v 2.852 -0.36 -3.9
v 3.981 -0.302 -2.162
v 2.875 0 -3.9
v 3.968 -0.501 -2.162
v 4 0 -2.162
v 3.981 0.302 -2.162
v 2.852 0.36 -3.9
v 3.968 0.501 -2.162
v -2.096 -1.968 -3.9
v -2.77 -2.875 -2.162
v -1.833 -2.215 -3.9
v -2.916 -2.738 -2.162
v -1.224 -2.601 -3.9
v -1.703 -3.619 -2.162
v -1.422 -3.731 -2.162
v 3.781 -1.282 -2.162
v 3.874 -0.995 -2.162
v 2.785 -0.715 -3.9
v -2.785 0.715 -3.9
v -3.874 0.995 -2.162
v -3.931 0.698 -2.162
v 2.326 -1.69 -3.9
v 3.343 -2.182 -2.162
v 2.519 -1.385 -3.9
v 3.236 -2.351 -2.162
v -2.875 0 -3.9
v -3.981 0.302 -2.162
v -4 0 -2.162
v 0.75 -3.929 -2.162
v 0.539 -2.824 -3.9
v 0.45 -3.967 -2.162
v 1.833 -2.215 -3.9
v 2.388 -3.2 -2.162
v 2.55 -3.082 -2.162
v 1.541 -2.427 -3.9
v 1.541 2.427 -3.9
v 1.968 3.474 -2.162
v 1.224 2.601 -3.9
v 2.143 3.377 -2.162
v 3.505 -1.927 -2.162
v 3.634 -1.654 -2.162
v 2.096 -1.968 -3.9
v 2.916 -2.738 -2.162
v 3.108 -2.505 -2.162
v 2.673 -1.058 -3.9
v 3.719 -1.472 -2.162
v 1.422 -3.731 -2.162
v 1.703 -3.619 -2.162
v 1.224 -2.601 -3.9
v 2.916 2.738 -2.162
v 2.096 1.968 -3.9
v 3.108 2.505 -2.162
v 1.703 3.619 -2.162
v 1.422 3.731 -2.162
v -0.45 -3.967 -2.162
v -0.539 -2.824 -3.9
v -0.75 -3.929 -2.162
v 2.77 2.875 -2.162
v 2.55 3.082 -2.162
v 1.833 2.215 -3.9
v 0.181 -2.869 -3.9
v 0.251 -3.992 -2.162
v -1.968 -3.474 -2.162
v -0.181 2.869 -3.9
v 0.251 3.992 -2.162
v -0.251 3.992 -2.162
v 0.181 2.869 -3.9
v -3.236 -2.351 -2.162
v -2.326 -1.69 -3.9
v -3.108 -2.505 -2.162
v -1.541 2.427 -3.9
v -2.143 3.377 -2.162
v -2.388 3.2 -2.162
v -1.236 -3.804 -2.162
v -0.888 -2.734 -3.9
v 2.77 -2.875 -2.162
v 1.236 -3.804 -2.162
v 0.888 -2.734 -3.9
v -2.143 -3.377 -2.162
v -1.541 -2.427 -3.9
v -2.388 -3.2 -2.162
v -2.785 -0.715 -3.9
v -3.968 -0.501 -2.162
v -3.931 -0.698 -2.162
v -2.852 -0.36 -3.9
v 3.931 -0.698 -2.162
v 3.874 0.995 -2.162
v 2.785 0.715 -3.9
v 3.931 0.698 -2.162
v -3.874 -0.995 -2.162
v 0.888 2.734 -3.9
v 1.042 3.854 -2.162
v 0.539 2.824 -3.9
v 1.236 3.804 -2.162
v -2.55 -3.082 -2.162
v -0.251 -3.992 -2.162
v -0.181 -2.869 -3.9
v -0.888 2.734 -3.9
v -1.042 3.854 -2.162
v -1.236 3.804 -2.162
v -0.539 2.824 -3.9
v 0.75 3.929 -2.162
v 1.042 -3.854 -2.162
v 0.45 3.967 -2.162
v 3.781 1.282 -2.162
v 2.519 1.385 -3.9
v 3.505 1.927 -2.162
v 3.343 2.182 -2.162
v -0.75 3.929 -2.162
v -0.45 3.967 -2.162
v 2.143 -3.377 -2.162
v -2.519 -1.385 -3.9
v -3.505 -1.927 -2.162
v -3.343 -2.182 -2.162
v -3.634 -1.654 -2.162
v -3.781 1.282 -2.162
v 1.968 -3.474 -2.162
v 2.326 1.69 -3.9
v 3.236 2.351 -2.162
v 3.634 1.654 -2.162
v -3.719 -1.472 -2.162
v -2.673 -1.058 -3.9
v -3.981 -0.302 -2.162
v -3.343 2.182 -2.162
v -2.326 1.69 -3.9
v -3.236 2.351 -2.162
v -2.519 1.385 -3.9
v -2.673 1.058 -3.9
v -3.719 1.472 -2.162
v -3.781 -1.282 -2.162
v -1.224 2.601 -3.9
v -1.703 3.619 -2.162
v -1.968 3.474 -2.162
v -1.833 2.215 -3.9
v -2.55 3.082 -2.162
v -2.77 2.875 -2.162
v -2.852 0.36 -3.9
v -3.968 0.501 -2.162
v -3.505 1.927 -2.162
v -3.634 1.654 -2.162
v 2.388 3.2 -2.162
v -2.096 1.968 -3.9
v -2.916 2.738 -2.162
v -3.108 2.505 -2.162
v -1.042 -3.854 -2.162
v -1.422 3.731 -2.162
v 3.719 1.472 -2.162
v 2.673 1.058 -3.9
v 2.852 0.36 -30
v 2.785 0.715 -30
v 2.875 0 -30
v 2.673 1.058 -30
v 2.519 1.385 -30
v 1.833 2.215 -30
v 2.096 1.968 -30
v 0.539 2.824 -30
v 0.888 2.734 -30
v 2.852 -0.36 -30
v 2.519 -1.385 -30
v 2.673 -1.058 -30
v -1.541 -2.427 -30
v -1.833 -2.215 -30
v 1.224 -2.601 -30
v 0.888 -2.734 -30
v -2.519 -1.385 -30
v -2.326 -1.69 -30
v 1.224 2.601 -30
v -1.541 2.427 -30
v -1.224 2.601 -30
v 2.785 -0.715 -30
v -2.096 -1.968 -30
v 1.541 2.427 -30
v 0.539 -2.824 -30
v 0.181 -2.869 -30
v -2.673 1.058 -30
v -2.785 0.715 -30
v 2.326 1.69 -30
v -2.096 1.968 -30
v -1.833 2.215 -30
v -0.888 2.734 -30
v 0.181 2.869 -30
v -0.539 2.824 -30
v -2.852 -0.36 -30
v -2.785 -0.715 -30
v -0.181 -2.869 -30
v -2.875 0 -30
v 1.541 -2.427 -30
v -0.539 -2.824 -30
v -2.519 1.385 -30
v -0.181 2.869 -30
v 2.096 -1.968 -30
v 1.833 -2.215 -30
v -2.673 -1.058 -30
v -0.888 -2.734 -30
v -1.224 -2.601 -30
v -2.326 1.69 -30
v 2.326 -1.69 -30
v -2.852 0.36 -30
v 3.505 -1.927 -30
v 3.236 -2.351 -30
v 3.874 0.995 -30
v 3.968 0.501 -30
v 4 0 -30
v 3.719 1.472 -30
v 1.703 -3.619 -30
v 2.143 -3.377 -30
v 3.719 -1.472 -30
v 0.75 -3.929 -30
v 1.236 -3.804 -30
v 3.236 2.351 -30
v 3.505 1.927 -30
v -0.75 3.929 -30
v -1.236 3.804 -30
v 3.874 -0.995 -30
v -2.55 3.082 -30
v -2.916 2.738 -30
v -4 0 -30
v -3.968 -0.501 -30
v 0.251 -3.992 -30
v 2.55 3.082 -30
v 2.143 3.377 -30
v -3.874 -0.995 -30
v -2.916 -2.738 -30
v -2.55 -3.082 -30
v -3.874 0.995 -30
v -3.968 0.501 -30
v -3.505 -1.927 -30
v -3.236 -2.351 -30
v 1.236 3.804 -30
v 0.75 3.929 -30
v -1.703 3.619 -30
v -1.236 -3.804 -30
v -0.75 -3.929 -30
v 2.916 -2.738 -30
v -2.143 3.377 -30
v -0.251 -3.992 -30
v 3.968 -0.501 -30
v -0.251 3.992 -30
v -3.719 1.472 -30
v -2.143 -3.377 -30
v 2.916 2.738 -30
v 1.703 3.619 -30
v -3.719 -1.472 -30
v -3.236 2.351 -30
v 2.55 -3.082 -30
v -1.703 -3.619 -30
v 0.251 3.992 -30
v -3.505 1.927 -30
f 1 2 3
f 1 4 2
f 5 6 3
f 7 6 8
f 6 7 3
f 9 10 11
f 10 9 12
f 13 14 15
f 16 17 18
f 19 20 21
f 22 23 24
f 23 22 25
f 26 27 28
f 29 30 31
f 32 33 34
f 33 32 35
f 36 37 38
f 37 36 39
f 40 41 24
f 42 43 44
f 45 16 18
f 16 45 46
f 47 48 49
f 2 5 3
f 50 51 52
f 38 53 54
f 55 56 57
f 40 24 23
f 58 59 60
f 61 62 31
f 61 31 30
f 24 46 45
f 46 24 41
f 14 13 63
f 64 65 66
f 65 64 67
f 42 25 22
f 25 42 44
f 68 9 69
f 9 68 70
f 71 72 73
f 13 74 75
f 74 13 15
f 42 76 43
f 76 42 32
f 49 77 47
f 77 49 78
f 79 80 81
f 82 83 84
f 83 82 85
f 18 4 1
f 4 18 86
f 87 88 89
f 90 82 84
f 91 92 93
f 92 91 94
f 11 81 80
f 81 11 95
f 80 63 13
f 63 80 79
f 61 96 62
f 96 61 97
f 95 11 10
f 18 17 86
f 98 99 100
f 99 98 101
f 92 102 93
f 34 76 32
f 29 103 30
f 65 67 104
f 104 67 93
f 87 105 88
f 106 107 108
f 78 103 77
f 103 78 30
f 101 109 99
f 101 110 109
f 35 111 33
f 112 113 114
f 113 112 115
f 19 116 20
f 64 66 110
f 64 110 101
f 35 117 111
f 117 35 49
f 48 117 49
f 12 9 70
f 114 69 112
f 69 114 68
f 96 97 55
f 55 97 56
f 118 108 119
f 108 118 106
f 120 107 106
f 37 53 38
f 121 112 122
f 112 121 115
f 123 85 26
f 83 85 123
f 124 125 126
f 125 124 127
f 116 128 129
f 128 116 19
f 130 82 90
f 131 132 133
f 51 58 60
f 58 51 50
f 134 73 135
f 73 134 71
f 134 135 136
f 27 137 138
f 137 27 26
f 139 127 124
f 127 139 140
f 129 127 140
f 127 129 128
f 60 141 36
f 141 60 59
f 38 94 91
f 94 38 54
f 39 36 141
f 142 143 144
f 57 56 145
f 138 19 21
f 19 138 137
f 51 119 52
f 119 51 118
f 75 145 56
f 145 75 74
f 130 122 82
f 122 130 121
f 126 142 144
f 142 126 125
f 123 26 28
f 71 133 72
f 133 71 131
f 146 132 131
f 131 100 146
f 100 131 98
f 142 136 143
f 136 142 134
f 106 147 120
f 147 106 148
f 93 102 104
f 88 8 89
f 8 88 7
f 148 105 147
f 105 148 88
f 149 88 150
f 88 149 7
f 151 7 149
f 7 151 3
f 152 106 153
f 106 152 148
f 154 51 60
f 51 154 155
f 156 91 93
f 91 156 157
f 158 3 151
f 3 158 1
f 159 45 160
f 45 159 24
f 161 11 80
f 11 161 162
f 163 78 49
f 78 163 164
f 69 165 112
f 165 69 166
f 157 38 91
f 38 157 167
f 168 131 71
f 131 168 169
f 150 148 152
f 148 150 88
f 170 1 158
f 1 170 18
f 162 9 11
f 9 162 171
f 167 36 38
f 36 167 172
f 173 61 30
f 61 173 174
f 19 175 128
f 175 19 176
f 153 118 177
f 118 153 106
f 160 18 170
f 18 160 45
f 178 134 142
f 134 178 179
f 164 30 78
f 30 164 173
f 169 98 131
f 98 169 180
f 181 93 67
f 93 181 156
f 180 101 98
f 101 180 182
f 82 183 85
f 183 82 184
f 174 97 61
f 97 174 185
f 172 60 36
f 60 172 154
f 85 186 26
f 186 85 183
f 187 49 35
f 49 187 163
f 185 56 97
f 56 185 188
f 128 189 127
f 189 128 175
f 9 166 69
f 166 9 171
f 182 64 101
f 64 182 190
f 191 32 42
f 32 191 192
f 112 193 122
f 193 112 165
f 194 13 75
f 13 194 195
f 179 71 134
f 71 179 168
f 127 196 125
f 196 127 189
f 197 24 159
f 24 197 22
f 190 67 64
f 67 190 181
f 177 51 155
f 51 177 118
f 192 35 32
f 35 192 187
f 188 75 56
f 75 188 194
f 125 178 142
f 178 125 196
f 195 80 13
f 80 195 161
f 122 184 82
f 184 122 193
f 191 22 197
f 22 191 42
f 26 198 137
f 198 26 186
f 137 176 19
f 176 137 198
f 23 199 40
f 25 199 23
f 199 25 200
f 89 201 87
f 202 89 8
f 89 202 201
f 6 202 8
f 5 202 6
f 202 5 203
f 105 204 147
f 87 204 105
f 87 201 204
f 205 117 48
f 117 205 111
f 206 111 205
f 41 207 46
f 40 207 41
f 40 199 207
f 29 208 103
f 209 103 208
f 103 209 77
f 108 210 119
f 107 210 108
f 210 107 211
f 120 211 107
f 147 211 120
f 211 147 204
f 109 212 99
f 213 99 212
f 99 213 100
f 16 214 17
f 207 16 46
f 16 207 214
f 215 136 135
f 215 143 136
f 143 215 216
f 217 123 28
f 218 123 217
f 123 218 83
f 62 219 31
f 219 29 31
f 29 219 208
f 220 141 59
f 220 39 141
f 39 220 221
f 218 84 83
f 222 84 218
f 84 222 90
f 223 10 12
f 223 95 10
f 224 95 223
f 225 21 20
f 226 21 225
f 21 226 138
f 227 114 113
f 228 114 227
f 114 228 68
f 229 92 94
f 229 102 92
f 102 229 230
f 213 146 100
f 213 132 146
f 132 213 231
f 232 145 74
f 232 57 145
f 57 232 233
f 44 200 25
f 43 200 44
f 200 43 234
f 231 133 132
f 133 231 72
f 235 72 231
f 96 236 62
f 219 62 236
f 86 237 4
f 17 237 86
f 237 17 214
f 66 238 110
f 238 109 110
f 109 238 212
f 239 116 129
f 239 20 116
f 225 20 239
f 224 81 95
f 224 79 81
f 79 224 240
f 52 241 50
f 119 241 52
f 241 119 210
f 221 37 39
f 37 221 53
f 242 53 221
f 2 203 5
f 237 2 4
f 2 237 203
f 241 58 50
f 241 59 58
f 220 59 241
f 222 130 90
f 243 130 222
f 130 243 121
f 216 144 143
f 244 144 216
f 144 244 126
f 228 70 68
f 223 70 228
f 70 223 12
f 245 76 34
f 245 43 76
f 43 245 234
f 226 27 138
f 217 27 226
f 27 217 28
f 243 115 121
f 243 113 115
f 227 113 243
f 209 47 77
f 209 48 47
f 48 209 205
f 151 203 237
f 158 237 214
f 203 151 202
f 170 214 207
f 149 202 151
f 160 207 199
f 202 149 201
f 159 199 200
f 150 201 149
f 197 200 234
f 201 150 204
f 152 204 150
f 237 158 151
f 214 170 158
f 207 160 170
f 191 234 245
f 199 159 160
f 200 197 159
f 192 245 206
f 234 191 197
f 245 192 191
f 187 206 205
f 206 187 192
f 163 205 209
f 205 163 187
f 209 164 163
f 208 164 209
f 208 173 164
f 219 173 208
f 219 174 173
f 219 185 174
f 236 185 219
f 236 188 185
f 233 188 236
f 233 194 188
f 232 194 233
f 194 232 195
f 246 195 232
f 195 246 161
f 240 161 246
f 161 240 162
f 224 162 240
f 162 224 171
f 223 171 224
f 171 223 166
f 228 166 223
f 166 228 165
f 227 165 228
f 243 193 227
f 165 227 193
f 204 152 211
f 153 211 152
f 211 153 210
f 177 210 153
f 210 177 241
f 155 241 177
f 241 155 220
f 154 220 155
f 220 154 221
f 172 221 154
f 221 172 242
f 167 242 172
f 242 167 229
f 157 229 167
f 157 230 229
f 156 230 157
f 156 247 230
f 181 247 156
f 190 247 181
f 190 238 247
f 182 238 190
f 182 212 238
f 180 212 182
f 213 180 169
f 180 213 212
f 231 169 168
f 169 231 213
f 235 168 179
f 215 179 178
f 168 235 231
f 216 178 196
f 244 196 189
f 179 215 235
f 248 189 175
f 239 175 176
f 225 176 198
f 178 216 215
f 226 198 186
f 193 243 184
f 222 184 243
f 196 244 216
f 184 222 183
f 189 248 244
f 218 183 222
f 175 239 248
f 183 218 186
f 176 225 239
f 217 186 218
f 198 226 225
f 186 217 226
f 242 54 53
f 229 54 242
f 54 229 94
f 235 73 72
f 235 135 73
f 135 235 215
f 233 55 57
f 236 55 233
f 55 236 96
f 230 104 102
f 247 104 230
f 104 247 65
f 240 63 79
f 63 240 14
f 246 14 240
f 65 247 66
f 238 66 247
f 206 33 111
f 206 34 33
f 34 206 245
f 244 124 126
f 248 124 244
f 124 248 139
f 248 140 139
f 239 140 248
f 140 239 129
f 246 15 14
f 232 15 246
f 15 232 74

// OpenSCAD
$fn = 50;

difference() {
	union() {
		translate(v = [0, 0, -30.0]) {
			cylinder(h = 30, r = 4.0);
		}
	}
	union() {
		translate(v = [0, 0, 0]) {
			rotate(a = [0, 0, 0]) {
				difference() {
					union() {
						translate(v = [0, 0, -33.0]) {
							cylinder(h = 33, r = 2.6);
						}
						translate(v = [0, 0, -3.9]) {
							cylinder(h = 3.9, r1 = 2.875, r2 = 5.4);
						}
						translate(v = [0, 0, -33.0]) {
							cylinder(h = 33, r = 2.875);
						}
						translate(v = [0, 0, -33.0]) {
							cylinder(h = 33, r = 2.6);
						}
					}
					union();
				}
			}
		}
	}
}
